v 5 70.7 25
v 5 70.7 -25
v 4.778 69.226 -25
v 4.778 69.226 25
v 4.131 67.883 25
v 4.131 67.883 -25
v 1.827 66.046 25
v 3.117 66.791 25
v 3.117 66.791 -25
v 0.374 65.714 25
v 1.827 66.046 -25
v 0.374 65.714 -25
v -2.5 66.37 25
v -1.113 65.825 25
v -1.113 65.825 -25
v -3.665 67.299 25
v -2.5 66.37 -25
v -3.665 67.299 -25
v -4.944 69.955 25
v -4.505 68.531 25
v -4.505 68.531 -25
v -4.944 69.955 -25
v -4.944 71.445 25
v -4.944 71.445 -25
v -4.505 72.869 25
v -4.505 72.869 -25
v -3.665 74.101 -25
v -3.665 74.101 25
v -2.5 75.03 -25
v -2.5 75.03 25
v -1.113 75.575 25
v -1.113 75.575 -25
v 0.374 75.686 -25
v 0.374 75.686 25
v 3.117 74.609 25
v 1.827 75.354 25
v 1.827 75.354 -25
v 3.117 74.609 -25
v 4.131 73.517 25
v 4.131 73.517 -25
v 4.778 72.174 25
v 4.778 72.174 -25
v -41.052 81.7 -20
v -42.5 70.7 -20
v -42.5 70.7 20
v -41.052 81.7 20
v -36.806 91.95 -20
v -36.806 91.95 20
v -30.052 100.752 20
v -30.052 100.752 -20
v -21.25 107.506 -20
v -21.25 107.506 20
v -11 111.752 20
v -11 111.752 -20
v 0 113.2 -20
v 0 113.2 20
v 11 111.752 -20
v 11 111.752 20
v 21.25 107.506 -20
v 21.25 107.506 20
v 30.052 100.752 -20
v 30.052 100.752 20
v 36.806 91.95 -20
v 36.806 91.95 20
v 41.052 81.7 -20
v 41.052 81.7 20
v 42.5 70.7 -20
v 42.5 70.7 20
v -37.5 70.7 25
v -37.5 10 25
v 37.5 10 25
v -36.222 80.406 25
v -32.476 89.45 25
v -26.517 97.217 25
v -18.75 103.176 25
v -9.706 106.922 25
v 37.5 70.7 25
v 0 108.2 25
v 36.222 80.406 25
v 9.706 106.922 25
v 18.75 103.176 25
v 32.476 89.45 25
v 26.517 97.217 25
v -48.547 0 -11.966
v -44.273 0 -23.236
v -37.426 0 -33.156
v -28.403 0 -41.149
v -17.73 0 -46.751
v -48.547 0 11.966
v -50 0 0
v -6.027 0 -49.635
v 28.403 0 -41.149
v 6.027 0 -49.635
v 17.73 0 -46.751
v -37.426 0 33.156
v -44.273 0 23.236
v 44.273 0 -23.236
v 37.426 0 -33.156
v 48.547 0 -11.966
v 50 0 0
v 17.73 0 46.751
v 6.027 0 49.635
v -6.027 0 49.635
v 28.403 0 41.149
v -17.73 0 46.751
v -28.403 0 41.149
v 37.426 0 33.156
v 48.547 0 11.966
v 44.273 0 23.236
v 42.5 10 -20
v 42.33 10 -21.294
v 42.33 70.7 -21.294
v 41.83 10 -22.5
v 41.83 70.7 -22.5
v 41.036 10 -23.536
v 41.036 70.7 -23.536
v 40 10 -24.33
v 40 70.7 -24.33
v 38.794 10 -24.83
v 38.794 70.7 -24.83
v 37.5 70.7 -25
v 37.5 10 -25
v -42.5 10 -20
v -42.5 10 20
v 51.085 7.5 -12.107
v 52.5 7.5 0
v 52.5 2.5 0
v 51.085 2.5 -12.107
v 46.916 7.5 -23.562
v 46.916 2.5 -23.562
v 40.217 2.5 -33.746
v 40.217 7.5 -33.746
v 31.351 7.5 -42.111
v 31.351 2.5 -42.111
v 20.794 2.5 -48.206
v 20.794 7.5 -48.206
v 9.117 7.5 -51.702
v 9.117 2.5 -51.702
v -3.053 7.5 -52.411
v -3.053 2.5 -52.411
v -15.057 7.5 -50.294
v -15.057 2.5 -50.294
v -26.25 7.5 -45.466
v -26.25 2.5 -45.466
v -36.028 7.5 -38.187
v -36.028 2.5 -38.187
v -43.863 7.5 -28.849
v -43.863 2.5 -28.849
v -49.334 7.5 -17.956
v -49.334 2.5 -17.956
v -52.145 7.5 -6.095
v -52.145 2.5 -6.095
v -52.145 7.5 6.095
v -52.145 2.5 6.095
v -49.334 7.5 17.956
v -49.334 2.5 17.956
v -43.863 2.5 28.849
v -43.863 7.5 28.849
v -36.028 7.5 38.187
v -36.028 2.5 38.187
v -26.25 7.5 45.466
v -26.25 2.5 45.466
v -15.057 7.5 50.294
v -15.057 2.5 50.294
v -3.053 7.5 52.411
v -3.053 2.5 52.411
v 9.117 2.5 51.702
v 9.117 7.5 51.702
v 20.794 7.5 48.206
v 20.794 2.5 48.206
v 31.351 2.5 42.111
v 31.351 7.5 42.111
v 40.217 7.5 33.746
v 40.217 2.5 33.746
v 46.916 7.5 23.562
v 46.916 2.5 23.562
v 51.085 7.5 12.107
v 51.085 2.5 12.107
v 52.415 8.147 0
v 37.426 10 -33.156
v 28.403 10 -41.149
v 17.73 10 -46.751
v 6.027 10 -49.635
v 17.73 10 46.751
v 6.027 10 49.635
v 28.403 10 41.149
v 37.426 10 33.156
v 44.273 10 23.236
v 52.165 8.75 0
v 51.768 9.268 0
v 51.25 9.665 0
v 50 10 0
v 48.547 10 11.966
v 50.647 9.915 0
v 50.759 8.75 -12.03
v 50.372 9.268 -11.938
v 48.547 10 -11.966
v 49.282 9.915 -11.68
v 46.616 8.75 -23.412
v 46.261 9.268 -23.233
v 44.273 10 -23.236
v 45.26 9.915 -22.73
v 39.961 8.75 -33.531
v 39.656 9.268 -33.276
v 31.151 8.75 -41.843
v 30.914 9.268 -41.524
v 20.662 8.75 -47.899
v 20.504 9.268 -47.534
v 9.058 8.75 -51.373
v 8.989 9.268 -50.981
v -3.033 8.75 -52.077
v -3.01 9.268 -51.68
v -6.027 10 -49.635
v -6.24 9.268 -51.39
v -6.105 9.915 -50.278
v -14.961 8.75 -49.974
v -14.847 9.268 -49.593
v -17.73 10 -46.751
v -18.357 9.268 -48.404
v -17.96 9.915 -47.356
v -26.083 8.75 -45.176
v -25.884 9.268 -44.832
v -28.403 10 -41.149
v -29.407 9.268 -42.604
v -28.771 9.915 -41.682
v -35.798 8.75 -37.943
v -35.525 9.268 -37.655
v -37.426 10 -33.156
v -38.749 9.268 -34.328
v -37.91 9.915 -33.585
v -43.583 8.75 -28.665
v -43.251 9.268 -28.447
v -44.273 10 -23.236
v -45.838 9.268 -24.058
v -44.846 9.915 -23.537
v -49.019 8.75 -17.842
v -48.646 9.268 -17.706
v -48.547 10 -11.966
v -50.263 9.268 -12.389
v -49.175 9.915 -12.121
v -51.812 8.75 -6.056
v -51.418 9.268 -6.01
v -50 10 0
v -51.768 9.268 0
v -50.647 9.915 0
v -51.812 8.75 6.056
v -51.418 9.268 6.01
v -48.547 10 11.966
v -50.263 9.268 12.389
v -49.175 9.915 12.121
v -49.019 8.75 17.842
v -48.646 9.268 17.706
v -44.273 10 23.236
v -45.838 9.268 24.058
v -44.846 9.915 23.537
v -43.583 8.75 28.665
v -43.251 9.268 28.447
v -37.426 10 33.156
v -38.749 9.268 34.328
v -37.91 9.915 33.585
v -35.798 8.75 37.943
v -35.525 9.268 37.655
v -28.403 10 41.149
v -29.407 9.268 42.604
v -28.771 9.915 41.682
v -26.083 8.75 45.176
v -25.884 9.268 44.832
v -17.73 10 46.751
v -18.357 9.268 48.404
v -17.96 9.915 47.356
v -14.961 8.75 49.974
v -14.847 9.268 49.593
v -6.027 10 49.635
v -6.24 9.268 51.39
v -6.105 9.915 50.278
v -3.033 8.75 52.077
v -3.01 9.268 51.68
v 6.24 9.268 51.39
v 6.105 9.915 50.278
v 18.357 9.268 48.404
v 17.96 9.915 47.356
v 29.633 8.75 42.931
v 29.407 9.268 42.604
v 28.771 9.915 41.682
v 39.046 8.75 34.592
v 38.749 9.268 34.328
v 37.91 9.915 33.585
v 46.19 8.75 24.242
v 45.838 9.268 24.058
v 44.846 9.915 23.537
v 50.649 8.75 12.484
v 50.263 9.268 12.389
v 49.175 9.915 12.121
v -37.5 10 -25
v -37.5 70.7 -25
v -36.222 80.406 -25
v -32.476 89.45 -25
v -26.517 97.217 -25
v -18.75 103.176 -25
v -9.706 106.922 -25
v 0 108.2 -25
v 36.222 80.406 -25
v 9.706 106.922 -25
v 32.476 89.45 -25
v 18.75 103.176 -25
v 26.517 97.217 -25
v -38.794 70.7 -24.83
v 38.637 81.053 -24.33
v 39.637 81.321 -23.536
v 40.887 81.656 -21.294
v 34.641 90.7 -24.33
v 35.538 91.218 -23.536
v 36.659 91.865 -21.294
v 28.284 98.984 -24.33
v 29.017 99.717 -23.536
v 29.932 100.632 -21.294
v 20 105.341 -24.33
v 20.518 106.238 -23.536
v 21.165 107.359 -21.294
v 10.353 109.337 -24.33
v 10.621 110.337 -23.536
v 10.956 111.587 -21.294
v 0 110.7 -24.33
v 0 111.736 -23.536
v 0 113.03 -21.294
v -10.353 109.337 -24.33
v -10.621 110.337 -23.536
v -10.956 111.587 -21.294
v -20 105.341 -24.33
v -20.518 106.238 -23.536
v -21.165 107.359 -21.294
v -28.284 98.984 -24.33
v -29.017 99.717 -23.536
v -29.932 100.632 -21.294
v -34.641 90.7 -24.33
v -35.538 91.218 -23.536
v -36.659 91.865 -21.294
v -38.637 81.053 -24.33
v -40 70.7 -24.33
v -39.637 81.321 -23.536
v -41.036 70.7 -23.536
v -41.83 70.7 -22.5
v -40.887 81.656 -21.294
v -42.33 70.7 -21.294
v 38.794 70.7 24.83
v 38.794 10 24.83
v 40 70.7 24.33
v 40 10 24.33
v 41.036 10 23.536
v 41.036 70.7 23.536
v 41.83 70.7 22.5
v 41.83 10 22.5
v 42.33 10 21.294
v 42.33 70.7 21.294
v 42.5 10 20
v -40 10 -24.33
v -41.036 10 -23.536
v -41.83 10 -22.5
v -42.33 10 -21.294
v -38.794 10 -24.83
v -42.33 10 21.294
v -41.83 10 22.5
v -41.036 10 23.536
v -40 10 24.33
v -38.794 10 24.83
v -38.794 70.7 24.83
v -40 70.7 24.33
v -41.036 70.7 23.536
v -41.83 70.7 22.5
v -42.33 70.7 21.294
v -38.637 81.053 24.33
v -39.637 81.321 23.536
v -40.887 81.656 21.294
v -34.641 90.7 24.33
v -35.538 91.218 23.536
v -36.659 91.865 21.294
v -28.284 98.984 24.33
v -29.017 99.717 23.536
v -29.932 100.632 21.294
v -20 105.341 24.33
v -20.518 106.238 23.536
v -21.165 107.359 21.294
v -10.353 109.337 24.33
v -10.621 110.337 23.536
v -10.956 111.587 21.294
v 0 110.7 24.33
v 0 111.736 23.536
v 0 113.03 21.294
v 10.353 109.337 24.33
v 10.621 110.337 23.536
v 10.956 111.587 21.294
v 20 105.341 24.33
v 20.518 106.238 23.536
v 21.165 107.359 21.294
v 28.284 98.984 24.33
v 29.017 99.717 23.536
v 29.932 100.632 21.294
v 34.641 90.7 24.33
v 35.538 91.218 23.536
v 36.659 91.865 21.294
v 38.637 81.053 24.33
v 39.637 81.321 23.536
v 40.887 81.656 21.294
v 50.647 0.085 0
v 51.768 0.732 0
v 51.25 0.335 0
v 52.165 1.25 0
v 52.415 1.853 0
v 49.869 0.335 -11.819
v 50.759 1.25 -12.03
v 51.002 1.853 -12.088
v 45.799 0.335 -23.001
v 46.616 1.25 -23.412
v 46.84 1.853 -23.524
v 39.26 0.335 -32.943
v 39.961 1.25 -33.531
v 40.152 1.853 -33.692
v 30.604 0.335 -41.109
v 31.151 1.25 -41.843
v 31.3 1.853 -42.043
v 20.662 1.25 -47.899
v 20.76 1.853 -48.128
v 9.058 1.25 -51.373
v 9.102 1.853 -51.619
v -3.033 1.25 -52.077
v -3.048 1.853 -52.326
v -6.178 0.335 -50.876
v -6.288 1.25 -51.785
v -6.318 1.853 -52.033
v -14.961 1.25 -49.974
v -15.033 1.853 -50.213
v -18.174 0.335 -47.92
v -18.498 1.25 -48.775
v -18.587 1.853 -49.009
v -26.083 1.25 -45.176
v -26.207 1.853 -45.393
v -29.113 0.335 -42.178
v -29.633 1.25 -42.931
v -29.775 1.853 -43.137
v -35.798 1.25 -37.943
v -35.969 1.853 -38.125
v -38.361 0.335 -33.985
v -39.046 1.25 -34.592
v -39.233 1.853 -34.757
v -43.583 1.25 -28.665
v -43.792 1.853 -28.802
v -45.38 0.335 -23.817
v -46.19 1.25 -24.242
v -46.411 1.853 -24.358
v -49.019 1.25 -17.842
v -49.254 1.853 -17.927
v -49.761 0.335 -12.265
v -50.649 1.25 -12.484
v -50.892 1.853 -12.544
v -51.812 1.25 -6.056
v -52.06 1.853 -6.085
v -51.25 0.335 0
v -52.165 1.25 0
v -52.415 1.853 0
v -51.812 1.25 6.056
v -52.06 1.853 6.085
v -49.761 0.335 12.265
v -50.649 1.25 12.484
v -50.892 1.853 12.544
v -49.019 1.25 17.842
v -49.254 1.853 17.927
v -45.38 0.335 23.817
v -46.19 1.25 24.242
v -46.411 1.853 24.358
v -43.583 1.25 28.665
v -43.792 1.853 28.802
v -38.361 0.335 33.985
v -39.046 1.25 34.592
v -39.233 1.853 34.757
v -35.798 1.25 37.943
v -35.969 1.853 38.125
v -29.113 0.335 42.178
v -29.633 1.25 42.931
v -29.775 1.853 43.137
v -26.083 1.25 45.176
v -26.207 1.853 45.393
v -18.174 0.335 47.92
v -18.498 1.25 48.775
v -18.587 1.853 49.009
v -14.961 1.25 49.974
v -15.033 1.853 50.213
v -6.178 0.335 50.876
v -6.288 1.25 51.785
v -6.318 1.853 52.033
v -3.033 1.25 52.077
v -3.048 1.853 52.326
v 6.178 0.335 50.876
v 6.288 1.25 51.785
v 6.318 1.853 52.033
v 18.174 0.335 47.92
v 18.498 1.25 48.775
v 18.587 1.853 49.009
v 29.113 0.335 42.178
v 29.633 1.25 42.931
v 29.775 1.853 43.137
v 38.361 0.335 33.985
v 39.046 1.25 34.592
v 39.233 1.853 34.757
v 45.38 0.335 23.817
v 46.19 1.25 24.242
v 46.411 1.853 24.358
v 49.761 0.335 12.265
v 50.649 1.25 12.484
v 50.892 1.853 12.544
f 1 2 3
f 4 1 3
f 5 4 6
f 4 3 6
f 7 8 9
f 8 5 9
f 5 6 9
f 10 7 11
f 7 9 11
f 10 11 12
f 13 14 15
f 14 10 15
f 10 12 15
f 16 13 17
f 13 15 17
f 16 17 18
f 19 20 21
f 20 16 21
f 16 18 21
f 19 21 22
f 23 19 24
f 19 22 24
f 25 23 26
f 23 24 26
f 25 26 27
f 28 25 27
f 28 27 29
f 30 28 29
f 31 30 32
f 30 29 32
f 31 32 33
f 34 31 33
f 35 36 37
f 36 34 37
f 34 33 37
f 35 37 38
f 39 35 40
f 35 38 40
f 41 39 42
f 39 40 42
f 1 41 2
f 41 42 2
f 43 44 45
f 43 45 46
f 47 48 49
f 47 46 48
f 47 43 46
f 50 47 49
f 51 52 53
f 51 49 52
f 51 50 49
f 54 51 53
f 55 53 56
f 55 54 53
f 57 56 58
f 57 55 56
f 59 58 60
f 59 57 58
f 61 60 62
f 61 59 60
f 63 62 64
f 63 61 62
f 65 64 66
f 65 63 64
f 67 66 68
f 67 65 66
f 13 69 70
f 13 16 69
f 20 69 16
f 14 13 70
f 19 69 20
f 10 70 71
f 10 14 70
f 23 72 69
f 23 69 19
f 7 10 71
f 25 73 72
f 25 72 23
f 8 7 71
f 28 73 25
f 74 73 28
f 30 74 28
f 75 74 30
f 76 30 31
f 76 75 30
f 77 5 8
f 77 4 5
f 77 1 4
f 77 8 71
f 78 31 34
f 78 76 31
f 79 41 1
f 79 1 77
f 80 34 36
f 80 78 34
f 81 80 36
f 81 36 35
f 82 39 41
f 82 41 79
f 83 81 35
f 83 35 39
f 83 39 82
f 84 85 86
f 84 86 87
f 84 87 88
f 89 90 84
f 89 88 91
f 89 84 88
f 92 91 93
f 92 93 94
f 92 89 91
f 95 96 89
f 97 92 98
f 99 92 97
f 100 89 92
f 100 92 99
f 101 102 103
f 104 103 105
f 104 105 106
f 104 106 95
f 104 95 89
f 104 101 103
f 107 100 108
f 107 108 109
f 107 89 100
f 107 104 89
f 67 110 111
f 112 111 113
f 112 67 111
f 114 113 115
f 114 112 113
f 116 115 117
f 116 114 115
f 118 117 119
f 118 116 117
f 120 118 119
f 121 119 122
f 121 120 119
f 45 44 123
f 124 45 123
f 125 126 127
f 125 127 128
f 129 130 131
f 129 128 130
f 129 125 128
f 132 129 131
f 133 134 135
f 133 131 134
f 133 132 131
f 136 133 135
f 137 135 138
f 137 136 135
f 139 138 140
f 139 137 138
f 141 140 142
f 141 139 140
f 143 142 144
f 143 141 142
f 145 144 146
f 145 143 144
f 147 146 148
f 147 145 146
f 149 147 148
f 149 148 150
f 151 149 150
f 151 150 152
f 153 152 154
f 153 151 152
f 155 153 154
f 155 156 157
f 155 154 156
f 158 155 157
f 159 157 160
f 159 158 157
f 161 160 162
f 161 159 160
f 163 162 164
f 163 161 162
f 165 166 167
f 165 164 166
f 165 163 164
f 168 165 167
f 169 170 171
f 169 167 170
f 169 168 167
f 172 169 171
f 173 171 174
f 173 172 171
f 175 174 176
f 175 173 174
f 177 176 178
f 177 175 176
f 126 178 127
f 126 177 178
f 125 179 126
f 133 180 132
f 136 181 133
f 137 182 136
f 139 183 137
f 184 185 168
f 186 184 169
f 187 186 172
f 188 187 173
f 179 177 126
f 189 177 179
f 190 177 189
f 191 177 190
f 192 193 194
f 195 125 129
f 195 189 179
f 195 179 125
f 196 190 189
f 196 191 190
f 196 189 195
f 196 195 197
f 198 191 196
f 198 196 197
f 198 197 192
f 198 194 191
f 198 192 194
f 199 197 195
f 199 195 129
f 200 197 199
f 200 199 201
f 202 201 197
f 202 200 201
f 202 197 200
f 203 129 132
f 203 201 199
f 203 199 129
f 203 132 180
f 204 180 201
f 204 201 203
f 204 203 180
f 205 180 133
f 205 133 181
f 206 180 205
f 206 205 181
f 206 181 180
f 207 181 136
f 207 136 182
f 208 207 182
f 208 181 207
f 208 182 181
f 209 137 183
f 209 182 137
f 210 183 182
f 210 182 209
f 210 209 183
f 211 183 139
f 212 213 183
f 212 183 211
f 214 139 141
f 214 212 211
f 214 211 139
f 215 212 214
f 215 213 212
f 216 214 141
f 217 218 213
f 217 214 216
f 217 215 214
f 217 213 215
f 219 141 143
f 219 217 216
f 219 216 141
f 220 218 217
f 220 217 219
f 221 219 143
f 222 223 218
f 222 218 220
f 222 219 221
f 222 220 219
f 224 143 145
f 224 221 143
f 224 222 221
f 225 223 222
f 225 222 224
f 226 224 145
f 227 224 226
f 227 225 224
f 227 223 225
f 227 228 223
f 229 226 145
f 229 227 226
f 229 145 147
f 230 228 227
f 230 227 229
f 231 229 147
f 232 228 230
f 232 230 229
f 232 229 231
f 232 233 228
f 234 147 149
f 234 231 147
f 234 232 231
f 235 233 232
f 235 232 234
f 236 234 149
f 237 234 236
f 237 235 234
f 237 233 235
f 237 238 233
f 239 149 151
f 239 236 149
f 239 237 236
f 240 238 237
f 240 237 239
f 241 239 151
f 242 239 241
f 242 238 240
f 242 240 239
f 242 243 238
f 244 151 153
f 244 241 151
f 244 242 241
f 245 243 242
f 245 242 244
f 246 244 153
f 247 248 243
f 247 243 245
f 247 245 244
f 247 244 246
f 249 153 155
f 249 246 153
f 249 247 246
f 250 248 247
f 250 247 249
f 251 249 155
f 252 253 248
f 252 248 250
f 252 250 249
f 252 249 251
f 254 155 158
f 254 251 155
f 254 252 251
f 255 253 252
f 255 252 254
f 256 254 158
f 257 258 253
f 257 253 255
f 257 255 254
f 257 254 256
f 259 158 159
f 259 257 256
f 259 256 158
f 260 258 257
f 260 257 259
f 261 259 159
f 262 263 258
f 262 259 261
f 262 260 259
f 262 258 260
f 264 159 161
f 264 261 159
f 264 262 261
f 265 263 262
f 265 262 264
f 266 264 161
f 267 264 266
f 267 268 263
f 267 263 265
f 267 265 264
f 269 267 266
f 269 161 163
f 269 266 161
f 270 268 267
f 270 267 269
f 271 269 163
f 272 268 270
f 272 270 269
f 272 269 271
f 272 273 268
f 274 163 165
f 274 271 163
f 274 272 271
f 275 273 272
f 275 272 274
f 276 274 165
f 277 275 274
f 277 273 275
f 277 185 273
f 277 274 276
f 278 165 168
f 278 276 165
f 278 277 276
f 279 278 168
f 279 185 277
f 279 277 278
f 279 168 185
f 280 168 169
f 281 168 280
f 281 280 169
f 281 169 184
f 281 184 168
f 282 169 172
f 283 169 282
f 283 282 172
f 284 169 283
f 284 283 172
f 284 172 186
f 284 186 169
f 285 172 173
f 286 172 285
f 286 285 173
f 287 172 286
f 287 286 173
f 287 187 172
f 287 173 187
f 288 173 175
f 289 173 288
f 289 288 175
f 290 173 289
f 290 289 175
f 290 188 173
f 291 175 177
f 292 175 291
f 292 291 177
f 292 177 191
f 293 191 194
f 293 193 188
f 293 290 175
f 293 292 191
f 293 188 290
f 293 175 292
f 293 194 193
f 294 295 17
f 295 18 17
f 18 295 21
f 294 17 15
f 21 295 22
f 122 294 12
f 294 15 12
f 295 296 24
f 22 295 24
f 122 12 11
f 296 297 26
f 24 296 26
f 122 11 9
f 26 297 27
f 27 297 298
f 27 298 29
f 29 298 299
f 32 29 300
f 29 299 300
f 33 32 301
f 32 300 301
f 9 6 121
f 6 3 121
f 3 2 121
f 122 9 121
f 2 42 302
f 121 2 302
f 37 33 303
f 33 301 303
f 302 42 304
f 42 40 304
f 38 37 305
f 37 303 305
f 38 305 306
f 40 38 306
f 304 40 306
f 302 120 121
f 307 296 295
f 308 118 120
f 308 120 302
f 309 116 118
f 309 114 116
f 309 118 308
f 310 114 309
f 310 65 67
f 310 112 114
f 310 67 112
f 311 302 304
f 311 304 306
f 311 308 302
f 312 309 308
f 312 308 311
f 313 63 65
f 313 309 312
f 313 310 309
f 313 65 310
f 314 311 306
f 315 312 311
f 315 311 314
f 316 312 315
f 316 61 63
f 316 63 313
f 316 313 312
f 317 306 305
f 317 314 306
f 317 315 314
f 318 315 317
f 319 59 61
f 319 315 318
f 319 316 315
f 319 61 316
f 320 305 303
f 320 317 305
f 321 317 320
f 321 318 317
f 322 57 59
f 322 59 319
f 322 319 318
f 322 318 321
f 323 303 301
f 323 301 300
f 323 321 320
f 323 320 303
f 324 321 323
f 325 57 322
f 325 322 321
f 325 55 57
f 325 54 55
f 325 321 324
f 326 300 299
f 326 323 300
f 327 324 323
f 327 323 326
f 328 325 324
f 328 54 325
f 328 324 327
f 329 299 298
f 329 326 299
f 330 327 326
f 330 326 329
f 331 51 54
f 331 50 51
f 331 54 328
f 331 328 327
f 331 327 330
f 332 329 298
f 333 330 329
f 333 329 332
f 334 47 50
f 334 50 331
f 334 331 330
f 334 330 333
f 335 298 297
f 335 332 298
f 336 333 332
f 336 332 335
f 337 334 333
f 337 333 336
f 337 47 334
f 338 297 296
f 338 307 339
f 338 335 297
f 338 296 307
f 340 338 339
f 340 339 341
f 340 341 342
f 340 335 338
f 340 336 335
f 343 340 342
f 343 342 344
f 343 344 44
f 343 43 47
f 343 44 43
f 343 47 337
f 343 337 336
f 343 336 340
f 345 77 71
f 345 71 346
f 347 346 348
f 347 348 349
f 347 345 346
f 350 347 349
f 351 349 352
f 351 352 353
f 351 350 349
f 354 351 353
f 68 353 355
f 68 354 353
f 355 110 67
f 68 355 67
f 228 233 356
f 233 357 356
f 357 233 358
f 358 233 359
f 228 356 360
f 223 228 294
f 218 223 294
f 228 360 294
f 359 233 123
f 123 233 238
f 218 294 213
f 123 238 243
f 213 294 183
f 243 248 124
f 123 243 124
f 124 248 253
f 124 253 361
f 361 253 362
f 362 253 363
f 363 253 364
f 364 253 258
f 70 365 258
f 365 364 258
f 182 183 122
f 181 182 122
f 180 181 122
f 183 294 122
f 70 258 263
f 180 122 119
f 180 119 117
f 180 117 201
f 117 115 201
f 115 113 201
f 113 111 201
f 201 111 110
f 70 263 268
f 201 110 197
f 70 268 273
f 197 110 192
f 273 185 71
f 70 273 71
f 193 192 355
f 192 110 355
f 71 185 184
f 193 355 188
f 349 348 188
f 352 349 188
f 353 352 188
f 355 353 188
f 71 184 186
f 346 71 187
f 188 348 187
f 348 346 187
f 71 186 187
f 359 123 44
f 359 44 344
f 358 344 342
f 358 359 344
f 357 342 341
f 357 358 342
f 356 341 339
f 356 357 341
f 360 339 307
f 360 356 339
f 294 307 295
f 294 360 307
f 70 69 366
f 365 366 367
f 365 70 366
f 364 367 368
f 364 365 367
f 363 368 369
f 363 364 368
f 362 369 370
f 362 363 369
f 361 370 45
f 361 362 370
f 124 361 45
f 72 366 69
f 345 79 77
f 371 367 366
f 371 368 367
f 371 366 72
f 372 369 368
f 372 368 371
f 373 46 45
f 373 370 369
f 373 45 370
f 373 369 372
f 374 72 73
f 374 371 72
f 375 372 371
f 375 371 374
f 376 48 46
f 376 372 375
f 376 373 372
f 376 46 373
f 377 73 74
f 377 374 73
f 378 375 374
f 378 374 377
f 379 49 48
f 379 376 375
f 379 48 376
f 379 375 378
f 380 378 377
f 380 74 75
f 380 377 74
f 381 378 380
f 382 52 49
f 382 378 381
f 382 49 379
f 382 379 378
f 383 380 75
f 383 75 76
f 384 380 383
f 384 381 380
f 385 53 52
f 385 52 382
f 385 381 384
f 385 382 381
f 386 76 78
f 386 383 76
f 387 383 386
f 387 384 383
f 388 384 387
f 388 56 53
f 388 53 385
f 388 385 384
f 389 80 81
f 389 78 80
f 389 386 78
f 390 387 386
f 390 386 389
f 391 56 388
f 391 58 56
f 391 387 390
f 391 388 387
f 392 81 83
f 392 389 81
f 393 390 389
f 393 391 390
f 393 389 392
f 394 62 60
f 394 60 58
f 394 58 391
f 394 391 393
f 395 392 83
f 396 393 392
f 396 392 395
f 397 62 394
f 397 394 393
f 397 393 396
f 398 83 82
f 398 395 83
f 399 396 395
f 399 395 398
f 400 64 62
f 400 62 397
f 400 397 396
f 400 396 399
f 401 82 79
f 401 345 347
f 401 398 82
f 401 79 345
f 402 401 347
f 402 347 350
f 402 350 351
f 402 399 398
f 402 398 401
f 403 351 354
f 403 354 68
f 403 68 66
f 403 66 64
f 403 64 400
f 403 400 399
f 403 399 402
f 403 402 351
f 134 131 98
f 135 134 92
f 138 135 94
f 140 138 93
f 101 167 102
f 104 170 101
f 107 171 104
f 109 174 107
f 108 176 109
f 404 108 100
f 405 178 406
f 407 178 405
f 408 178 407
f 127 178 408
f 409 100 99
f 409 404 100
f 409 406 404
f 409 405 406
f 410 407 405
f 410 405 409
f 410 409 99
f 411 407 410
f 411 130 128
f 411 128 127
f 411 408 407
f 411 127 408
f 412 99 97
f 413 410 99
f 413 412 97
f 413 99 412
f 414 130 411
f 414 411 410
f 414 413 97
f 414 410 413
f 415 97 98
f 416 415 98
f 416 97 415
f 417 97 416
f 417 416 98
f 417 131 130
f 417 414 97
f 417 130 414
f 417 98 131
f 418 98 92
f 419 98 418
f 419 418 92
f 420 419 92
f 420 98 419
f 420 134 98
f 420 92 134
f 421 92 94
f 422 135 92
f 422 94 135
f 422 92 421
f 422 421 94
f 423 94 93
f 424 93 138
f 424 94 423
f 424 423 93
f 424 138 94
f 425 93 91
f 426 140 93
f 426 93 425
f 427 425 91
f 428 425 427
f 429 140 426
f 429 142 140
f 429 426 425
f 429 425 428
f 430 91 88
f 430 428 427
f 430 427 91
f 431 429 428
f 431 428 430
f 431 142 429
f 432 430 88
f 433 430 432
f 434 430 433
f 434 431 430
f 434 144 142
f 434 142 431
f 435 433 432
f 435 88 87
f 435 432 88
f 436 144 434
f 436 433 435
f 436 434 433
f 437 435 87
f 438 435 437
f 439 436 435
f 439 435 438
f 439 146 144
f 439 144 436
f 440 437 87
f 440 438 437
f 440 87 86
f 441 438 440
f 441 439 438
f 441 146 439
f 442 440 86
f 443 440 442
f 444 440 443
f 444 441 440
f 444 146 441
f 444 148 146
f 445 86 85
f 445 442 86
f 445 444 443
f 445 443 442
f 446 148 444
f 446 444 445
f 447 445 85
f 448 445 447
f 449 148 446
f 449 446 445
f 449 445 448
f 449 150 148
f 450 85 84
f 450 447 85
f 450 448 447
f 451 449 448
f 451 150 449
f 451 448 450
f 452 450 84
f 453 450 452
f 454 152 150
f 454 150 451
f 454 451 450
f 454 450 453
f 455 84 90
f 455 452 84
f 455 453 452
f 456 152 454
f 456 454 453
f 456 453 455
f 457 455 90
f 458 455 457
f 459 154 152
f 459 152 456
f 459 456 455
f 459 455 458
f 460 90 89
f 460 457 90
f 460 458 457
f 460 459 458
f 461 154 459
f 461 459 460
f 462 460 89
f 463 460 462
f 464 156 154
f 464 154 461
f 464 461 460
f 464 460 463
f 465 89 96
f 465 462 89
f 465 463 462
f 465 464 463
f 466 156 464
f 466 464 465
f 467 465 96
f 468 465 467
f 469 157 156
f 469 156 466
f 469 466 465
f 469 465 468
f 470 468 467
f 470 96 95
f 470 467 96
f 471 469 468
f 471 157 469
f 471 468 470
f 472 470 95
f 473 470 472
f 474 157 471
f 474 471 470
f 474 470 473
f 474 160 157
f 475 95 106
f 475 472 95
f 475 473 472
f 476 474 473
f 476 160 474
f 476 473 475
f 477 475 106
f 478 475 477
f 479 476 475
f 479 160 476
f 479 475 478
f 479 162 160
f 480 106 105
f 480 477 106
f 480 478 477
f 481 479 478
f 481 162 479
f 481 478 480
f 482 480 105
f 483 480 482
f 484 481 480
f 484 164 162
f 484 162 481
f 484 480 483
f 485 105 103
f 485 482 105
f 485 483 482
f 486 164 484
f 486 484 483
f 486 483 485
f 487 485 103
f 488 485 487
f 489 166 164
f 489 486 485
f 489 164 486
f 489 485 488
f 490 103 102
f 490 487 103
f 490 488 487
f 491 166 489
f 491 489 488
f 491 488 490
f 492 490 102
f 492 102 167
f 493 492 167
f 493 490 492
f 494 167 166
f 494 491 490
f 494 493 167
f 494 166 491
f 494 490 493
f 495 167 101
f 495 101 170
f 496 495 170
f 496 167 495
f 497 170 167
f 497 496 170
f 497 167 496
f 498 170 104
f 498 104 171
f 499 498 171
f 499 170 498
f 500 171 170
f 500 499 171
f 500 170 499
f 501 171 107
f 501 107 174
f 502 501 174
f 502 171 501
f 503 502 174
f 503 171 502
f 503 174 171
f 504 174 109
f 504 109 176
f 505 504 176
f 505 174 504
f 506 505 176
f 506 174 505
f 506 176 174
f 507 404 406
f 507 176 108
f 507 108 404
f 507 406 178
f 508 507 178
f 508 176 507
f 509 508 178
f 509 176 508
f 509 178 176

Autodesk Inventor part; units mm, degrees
ref_plane "YZ Plane" through (0, 0, 0) normal (1, 0, 0) x (0, 1, 0)
ref_plane "XZ Plane" through (0, 0, 0) normal (0, 1, 0) x (-1, 0, 0)
ref_plane "XY Plane" through (0, 0, 0) normal (0, 0, 1) x (1, 0, 0)
sketch "Sketch1" plane through (0, 0, 0) normal (0, 0, 1) x (1, 0, 0)
  line L0 (0, 0) -> (50, 0)
  line L1 (52.5, 2.5) -> (52.5, 7.5)
  line L2 (50, 10) -> (0, 10)
  line L3 (0, 10) -> (0, 0)
  arc A0 (52.5, 7.5) -> (50, 10) centre (50, 7.5) ccw
  arc A1 (50, 0) -> (52.5, 2.5) centre (50, 2.5) ccw
  point P0 (52.5, 0)
  point P1 (52.5, 10)
  dimension "d0" = 105
  dimension "d1" = 10
  dimension "d2" = 2.5
revolve "Revolution1" add sketch "Sketch1" angle 360 about axis through (0, 10, 0) along (0, -1, 0)
sketch "Sketch2" plane through (0, 0, 0) normal (0, 0, 1) x (1, 0, 0)
  line L0 (-52.5, 2.5) -> (52.5, 2.5) projected
  line L1 (-50, 0) -> (50, 0) projected
  line L2 (-50, 10) -> (50, 10) projected
  line L3 (-52.5, 7.5) -> (52.5, 7.5) projected
  line L4 (-52.5, 7.5) -> (52.5, 7.5) projected
  line L5 (-52.5, 2.5) -> (52.5, 2.5) projected
  line L6 (-42.5, 10) -> (42.5, 10)
  line L7 (42.5, 10) -> (42.5, 70.7)
  line L8 (42.5, 70.7) -> (-42.5, 70.7) construction
  line L9 (-42.5, 70.7) -> (-42.5, 10)
  line L10 (0, 70.7) -> (0, 10) construction
  line L11 (-50, 10) -> (50, 10) projected
  arc A0 (42.5, 70.7) -> (-42.5, 70.7) centre (0, 70.7) ccw
  circle A1 centre (0, 70.7) radius 5
  point P0 (0, 0)
  point P1 (0, 0)
  dimension "d4" = 85
  dimension "d5" = 70.7
  dimension "d9" = 10
extrude "Extrusion1" add sketch "Sketch2" along normal mid plane 50
fillet "Fillet1" radius 5 6 edges at (-42.5, 40.35, 25) (42.5, 40.35, 25) (0, 113.2, 25) (42.5, 40.35, -25) (-42.5, 40.35, -25) (0, 113.2, -25)
properties part number "Base2"
